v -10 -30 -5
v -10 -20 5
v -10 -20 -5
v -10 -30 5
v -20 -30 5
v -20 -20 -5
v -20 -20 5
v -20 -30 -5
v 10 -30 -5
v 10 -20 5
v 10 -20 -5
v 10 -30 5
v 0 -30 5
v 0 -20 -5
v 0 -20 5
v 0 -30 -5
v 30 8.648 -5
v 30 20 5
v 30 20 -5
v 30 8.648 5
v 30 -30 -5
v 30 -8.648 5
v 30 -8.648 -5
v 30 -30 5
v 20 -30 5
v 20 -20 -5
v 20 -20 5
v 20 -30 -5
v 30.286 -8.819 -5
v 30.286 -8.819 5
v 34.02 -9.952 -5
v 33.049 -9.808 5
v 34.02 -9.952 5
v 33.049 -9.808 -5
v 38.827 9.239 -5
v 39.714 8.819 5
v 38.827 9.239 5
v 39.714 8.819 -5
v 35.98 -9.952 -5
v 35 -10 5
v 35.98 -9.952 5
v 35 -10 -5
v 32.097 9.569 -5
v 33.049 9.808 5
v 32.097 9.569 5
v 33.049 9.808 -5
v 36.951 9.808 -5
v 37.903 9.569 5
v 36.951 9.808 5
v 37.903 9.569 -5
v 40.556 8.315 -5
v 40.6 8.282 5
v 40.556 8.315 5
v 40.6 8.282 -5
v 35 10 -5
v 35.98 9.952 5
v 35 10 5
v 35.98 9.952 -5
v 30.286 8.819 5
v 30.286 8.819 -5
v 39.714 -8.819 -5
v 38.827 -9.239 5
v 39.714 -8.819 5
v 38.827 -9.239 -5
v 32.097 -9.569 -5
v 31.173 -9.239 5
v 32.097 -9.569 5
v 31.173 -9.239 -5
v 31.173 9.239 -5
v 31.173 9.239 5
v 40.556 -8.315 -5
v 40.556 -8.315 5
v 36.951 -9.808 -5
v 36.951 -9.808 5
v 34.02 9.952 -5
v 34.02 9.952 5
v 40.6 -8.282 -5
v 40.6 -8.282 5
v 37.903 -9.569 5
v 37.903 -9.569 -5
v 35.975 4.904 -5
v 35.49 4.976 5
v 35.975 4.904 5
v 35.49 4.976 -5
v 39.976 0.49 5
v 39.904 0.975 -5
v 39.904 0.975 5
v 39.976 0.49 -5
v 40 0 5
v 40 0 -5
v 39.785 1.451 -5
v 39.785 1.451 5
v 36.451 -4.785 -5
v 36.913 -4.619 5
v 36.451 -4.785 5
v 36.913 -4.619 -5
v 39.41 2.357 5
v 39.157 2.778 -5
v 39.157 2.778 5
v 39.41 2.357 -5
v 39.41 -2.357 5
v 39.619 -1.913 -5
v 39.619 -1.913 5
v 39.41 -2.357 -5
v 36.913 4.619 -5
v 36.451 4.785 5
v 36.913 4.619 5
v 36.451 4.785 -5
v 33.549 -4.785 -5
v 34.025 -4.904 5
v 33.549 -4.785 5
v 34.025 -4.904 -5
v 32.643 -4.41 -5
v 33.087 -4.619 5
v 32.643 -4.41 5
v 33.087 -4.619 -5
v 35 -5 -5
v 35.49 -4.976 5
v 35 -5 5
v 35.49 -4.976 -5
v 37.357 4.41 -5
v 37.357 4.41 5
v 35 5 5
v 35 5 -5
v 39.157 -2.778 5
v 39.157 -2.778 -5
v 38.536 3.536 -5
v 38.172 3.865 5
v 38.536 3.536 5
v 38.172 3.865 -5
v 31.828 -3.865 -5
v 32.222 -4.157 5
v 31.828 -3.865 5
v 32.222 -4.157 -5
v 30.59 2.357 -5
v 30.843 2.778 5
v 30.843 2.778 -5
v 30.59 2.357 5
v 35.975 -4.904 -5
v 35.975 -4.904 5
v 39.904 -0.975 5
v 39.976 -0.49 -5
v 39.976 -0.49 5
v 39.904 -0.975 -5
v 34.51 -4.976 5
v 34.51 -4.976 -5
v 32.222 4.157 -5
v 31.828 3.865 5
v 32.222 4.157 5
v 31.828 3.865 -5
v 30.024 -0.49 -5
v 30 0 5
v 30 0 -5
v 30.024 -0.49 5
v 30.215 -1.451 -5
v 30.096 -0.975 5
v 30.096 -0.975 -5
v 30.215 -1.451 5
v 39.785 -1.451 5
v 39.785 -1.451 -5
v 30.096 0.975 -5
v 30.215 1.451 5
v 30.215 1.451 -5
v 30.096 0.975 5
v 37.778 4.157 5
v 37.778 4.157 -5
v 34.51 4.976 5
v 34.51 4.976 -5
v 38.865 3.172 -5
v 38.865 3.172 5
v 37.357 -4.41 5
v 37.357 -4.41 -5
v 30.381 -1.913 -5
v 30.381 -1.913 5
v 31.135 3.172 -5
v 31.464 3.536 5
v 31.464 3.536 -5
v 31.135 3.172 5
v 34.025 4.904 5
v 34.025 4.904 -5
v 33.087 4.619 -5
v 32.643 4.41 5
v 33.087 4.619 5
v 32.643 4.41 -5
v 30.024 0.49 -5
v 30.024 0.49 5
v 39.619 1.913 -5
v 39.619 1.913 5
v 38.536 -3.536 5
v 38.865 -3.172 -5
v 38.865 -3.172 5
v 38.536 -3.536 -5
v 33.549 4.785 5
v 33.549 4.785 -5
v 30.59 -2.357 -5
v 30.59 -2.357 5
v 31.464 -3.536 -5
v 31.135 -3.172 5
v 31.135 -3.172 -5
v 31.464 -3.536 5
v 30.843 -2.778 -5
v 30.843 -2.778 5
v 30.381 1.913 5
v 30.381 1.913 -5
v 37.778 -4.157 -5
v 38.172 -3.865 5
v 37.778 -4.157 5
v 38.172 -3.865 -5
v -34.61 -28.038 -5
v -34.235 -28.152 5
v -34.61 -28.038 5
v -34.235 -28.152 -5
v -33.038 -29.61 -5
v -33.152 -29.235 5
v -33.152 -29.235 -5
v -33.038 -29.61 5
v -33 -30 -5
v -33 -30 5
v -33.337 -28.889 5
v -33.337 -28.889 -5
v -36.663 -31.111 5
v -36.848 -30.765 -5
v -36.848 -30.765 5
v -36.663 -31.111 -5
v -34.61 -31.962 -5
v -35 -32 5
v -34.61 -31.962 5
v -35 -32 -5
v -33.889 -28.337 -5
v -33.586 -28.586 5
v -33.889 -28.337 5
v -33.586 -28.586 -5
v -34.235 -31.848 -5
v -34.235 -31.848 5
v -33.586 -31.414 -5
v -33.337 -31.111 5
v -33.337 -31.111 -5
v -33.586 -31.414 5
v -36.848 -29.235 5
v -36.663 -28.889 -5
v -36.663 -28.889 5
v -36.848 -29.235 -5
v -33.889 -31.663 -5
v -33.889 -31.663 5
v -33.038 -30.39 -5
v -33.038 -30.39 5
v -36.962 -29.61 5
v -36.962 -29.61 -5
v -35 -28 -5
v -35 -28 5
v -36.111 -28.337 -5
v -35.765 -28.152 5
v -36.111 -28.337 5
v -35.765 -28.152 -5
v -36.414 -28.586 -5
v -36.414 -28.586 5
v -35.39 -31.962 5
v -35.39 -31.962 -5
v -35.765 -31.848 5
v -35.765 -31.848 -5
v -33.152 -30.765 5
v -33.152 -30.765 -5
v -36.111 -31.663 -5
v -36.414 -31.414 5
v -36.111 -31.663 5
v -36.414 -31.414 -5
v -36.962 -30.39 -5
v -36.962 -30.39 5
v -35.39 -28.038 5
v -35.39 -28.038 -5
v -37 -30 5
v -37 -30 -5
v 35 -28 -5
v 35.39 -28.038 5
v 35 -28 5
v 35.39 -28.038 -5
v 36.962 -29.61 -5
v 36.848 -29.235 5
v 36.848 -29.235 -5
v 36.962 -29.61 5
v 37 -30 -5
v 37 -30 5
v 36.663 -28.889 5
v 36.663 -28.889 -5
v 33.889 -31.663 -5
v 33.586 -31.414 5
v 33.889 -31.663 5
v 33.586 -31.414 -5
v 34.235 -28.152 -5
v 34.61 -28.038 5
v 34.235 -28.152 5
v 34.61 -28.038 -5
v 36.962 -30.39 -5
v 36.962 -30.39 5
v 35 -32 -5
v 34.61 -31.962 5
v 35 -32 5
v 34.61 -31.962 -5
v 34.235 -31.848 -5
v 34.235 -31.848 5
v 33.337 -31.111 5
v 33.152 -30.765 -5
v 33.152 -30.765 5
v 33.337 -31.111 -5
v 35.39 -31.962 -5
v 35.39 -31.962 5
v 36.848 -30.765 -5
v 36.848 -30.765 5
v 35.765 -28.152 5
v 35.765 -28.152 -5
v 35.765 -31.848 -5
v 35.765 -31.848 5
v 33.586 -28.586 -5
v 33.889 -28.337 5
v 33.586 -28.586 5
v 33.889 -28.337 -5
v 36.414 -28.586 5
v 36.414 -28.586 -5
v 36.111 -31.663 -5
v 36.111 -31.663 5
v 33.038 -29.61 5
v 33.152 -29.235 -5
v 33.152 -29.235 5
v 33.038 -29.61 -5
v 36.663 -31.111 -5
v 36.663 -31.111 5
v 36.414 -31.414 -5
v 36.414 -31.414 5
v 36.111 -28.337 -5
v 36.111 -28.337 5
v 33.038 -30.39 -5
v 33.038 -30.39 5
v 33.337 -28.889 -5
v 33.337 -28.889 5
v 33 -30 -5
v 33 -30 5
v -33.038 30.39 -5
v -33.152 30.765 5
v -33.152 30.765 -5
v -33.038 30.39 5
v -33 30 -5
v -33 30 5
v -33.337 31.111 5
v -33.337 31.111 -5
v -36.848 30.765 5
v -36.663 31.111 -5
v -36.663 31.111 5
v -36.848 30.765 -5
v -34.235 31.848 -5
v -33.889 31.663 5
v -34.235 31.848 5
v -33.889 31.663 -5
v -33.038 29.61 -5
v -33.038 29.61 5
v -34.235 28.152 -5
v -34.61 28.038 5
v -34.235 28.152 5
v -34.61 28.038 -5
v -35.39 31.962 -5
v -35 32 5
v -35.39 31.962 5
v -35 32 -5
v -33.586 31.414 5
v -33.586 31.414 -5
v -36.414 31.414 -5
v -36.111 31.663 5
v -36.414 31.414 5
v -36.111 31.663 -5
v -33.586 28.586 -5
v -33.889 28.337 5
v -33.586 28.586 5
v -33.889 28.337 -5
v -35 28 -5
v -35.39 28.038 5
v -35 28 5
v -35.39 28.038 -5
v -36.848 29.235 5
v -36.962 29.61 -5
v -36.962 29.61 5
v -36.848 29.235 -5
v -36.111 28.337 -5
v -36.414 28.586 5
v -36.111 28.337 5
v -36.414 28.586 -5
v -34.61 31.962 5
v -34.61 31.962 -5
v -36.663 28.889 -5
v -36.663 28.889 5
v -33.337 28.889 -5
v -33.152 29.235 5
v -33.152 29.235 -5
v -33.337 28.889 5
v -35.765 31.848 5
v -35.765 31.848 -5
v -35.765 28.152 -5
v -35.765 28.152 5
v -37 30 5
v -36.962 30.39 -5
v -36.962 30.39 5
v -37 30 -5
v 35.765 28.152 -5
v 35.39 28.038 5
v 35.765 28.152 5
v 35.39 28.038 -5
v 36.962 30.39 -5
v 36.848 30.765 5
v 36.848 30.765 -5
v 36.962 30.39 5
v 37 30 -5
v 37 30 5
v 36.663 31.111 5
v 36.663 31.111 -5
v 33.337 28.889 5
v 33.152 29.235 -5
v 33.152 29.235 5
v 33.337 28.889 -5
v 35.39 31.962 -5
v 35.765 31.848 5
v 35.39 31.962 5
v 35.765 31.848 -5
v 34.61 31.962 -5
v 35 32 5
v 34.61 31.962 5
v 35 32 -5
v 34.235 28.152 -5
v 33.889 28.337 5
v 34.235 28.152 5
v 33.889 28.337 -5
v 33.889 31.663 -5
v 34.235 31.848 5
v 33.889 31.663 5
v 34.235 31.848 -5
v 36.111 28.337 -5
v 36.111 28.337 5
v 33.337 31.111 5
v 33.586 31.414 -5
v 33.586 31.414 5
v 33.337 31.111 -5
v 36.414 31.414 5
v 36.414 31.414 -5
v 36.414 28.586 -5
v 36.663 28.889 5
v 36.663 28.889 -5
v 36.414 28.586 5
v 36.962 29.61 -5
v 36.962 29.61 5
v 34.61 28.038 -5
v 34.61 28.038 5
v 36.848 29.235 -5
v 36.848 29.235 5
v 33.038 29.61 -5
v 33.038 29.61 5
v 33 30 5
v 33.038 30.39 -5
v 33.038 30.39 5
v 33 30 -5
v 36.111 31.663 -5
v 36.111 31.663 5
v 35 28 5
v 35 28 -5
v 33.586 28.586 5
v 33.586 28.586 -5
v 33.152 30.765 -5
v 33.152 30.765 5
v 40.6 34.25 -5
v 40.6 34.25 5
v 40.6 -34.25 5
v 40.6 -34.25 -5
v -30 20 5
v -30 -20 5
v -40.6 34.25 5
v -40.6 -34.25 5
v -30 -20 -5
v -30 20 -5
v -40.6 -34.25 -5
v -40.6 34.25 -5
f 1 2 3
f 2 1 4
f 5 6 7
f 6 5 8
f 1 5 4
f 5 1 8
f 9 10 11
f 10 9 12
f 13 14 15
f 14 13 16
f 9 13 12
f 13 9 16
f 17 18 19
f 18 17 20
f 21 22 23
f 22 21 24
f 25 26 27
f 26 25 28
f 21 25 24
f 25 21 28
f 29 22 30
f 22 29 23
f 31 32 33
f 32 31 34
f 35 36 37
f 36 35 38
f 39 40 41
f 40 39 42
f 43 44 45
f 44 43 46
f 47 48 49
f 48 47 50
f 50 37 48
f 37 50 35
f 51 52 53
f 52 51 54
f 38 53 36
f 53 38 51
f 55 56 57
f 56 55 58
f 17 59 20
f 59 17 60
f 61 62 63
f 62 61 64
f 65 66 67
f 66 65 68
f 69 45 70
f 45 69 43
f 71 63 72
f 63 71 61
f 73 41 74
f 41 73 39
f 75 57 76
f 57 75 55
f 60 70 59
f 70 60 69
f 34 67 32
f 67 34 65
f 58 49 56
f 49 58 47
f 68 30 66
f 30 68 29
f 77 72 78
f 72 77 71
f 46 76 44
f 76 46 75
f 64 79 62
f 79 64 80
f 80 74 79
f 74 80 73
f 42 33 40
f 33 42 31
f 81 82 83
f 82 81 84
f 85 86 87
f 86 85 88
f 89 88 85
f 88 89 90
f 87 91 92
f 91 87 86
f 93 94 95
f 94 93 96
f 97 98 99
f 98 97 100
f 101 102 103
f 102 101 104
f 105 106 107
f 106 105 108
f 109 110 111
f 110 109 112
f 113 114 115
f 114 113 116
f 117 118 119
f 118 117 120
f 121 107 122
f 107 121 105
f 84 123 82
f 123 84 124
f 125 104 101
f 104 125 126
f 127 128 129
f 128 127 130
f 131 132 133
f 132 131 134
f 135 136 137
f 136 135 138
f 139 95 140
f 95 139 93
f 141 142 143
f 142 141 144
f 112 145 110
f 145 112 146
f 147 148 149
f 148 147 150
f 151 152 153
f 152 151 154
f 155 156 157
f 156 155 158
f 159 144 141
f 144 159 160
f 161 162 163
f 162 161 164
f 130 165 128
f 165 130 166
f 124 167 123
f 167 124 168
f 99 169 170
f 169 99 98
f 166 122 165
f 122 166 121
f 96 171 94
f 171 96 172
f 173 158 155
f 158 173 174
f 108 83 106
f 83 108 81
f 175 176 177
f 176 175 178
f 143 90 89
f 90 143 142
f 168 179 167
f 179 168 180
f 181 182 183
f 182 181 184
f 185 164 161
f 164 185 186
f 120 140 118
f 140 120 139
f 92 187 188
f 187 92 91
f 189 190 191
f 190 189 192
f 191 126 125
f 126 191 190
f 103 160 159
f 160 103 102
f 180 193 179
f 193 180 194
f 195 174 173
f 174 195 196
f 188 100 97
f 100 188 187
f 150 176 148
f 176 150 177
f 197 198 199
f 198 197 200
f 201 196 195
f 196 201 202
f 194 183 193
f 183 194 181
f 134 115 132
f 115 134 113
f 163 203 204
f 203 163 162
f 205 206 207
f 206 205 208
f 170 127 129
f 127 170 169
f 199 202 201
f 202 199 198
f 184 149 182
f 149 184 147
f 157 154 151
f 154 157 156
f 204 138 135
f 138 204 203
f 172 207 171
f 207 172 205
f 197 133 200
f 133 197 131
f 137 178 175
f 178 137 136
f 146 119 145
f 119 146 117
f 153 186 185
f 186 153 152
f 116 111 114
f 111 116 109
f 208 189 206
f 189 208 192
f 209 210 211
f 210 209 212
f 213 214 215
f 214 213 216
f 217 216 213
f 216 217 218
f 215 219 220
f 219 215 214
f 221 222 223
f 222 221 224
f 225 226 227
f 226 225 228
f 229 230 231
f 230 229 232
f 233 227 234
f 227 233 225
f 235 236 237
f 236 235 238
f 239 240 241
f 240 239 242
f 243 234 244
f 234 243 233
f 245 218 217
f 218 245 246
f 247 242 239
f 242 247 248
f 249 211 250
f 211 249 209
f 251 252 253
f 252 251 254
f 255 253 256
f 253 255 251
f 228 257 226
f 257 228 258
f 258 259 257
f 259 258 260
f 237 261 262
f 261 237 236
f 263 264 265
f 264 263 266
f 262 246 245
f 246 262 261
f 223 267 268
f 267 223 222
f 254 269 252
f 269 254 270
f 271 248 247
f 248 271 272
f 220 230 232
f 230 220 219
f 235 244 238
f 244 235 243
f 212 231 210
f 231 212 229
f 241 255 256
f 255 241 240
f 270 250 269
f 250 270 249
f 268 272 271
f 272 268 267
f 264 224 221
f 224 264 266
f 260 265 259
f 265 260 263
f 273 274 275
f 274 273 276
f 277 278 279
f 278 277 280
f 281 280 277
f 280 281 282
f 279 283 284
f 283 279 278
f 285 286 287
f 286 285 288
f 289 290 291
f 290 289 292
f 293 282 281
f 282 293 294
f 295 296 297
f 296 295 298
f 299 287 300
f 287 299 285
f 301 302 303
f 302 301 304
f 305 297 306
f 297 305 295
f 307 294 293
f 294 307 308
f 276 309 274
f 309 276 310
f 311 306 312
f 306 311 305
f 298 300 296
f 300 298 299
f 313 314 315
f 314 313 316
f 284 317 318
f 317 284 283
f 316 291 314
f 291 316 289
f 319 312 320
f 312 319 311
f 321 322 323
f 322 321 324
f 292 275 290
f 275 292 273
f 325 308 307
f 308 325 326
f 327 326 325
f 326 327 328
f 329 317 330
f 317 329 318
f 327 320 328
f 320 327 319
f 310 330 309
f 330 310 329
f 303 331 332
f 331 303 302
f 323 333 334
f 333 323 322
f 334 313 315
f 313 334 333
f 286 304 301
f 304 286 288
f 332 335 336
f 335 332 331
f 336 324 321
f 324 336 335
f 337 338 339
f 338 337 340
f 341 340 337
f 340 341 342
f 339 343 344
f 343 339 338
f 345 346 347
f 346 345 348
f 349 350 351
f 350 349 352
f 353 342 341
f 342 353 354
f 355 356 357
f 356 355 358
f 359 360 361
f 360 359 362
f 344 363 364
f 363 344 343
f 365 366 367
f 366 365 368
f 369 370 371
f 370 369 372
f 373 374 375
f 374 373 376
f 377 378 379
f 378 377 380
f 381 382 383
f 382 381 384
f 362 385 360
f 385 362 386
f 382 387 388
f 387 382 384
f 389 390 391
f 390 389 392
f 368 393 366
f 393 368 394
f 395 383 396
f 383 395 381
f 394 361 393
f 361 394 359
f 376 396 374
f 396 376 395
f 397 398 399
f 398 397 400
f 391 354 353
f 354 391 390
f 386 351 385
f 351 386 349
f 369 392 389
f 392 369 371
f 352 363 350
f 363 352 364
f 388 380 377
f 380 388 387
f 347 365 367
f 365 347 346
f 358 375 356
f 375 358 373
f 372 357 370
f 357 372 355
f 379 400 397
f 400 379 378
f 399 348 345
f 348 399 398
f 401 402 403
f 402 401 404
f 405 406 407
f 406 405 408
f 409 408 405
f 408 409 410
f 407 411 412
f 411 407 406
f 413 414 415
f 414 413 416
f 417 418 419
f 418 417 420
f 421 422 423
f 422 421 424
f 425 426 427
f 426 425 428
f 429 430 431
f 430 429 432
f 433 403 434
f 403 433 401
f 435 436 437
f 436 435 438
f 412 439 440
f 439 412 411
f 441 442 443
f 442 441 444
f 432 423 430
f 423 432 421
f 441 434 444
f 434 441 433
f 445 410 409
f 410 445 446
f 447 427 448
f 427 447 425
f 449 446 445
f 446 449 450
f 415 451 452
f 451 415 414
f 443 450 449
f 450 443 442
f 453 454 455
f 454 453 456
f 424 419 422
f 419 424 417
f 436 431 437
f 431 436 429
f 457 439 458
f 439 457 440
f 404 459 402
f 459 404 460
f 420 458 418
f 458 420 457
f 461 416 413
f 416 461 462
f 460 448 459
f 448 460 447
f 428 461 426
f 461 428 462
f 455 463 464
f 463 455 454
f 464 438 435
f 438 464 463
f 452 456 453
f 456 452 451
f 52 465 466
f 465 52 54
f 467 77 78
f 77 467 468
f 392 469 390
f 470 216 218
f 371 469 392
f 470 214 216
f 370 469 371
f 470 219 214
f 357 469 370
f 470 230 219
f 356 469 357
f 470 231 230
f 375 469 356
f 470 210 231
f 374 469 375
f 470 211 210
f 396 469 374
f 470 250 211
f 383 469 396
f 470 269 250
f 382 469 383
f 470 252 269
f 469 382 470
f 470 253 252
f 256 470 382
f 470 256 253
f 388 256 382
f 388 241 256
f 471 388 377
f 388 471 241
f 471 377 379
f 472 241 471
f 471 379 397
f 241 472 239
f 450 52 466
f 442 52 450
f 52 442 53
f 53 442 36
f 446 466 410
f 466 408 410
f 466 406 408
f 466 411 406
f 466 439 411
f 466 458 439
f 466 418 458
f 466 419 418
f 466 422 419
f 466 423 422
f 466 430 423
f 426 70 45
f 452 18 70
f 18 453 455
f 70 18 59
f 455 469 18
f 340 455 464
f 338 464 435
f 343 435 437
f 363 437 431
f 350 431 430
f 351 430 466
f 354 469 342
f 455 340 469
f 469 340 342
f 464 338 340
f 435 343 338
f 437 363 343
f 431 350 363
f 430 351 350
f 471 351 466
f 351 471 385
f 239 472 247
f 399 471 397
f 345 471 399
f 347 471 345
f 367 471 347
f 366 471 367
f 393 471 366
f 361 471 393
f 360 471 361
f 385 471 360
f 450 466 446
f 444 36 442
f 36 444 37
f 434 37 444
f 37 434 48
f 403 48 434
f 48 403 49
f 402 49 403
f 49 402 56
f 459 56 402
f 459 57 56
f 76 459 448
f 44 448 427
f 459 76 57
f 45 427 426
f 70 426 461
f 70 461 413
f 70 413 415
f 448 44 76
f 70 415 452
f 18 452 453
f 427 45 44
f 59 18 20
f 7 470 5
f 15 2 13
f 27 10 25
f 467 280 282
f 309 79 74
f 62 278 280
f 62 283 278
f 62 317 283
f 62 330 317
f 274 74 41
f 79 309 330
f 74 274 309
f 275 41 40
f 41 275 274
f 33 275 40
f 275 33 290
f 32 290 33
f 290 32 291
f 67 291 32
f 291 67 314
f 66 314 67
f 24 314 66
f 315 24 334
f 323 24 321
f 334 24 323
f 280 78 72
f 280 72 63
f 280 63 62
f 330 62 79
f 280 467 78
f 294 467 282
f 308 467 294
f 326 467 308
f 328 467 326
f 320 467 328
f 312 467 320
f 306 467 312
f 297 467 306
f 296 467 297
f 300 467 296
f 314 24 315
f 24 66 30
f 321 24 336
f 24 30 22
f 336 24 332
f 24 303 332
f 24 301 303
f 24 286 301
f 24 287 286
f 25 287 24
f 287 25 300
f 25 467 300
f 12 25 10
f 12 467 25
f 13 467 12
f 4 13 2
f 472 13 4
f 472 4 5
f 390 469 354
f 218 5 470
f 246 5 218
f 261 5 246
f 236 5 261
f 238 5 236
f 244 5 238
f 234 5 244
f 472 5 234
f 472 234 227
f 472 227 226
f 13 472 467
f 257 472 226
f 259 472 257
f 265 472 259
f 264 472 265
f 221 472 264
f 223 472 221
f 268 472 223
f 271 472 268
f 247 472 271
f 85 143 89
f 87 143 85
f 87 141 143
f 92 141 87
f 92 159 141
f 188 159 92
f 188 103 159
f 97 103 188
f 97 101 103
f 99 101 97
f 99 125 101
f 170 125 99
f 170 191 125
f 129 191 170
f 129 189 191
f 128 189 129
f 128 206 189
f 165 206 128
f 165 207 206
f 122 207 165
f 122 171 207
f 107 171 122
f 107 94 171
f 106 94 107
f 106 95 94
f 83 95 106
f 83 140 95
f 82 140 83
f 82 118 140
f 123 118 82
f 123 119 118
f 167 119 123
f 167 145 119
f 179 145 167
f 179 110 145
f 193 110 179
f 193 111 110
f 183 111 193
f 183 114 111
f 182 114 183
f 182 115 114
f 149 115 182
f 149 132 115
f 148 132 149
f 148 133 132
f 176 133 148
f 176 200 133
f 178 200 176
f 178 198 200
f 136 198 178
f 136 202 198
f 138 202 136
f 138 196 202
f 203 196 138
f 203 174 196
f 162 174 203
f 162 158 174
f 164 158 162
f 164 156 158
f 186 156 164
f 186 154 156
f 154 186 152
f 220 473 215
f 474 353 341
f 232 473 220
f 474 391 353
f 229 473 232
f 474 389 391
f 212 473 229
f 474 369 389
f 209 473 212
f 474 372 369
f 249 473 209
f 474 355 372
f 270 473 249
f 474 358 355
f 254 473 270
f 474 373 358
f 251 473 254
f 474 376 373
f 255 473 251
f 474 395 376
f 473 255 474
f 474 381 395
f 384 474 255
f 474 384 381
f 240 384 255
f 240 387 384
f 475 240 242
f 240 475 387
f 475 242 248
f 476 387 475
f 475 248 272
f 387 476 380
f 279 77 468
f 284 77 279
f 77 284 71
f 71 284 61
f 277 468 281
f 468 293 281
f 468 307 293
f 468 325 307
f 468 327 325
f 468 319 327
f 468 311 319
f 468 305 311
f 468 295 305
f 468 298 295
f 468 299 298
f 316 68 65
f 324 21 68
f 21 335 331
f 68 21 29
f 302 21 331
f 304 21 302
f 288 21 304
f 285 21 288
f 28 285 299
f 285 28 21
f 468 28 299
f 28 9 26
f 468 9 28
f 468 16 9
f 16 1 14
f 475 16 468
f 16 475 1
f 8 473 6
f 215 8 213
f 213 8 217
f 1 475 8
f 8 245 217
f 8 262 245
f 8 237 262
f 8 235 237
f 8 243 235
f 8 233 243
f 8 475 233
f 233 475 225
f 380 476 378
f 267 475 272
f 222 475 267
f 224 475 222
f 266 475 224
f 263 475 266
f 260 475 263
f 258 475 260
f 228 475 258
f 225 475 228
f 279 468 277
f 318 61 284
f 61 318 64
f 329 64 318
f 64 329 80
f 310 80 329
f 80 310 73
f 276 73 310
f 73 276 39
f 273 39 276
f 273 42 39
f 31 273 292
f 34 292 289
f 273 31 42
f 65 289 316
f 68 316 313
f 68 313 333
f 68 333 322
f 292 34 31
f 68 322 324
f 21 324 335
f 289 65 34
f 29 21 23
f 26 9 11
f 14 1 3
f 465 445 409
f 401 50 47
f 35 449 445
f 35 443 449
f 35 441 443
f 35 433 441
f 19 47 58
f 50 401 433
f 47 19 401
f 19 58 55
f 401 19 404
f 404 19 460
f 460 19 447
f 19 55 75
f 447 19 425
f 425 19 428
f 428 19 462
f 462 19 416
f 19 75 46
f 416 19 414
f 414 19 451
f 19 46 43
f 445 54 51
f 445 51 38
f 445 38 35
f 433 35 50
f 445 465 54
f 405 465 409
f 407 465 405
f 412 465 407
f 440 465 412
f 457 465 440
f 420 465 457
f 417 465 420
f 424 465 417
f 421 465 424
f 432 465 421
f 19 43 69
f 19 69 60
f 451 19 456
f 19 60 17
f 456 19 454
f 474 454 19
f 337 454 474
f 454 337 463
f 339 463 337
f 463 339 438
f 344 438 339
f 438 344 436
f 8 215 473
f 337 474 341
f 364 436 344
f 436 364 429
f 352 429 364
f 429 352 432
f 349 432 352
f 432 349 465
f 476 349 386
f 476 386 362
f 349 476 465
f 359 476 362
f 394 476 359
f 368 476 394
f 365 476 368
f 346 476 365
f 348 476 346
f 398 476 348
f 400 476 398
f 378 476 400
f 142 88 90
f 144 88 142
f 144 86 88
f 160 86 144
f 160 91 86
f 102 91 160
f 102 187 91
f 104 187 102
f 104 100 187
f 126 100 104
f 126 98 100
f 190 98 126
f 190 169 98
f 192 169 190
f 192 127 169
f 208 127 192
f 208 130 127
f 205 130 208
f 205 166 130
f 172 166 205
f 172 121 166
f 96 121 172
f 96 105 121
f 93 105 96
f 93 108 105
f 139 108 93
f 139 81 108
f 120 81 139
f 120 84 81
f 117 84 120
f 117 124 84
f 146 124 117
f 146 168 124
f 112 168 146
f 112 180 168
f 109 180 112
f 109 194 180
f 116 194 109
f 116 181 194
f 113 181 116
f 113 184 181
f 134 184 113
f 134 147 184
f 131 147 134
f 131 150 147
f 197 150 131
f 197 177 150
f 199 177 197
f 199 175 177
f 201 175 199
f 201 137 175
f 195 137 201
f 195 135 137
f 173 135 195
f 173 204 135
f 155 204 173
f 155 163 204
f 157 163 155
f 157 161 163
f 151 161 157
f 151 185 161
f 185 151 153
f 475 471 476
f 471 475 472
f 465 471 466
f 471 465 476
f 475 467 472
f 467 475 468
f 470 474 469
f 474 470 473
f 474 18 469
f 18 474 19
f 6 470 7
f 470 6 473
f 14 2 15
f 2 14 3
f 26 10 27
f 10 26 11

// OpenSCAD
module mounting_bracket() {
    difference() {
        // Main plate
        translate([-40.6, -34.25, -5])
            cube([81.2, 68.5, 10]);

        // Central large cutout
        translate([-30, -20, -6])
            cube([60, 40, 12]);

        // Smaller rectangular window cutouts
        for (i = [-20, 0, 20])
            translate([i, -30, -6])
                cube([10, 20, 12]);

        // Circular through-hole ring feature
        translate([35, 0, -6])
            difference() {
                cylinder(h=12, r=10, $fn=64);
                translate([0, 0, -1])
                    cylinder(h=14, r=5, $fn=64);
            }

        // Fastener through-holes on tabs
        for (pos = [[-35, -30], [35, -30], [-35, 30], [35, 30]])
            translate([pos[0], pos[1], -6])
                cylinder(h=12, r=2, $fn=32);
    }
}

mounting_bracket();
